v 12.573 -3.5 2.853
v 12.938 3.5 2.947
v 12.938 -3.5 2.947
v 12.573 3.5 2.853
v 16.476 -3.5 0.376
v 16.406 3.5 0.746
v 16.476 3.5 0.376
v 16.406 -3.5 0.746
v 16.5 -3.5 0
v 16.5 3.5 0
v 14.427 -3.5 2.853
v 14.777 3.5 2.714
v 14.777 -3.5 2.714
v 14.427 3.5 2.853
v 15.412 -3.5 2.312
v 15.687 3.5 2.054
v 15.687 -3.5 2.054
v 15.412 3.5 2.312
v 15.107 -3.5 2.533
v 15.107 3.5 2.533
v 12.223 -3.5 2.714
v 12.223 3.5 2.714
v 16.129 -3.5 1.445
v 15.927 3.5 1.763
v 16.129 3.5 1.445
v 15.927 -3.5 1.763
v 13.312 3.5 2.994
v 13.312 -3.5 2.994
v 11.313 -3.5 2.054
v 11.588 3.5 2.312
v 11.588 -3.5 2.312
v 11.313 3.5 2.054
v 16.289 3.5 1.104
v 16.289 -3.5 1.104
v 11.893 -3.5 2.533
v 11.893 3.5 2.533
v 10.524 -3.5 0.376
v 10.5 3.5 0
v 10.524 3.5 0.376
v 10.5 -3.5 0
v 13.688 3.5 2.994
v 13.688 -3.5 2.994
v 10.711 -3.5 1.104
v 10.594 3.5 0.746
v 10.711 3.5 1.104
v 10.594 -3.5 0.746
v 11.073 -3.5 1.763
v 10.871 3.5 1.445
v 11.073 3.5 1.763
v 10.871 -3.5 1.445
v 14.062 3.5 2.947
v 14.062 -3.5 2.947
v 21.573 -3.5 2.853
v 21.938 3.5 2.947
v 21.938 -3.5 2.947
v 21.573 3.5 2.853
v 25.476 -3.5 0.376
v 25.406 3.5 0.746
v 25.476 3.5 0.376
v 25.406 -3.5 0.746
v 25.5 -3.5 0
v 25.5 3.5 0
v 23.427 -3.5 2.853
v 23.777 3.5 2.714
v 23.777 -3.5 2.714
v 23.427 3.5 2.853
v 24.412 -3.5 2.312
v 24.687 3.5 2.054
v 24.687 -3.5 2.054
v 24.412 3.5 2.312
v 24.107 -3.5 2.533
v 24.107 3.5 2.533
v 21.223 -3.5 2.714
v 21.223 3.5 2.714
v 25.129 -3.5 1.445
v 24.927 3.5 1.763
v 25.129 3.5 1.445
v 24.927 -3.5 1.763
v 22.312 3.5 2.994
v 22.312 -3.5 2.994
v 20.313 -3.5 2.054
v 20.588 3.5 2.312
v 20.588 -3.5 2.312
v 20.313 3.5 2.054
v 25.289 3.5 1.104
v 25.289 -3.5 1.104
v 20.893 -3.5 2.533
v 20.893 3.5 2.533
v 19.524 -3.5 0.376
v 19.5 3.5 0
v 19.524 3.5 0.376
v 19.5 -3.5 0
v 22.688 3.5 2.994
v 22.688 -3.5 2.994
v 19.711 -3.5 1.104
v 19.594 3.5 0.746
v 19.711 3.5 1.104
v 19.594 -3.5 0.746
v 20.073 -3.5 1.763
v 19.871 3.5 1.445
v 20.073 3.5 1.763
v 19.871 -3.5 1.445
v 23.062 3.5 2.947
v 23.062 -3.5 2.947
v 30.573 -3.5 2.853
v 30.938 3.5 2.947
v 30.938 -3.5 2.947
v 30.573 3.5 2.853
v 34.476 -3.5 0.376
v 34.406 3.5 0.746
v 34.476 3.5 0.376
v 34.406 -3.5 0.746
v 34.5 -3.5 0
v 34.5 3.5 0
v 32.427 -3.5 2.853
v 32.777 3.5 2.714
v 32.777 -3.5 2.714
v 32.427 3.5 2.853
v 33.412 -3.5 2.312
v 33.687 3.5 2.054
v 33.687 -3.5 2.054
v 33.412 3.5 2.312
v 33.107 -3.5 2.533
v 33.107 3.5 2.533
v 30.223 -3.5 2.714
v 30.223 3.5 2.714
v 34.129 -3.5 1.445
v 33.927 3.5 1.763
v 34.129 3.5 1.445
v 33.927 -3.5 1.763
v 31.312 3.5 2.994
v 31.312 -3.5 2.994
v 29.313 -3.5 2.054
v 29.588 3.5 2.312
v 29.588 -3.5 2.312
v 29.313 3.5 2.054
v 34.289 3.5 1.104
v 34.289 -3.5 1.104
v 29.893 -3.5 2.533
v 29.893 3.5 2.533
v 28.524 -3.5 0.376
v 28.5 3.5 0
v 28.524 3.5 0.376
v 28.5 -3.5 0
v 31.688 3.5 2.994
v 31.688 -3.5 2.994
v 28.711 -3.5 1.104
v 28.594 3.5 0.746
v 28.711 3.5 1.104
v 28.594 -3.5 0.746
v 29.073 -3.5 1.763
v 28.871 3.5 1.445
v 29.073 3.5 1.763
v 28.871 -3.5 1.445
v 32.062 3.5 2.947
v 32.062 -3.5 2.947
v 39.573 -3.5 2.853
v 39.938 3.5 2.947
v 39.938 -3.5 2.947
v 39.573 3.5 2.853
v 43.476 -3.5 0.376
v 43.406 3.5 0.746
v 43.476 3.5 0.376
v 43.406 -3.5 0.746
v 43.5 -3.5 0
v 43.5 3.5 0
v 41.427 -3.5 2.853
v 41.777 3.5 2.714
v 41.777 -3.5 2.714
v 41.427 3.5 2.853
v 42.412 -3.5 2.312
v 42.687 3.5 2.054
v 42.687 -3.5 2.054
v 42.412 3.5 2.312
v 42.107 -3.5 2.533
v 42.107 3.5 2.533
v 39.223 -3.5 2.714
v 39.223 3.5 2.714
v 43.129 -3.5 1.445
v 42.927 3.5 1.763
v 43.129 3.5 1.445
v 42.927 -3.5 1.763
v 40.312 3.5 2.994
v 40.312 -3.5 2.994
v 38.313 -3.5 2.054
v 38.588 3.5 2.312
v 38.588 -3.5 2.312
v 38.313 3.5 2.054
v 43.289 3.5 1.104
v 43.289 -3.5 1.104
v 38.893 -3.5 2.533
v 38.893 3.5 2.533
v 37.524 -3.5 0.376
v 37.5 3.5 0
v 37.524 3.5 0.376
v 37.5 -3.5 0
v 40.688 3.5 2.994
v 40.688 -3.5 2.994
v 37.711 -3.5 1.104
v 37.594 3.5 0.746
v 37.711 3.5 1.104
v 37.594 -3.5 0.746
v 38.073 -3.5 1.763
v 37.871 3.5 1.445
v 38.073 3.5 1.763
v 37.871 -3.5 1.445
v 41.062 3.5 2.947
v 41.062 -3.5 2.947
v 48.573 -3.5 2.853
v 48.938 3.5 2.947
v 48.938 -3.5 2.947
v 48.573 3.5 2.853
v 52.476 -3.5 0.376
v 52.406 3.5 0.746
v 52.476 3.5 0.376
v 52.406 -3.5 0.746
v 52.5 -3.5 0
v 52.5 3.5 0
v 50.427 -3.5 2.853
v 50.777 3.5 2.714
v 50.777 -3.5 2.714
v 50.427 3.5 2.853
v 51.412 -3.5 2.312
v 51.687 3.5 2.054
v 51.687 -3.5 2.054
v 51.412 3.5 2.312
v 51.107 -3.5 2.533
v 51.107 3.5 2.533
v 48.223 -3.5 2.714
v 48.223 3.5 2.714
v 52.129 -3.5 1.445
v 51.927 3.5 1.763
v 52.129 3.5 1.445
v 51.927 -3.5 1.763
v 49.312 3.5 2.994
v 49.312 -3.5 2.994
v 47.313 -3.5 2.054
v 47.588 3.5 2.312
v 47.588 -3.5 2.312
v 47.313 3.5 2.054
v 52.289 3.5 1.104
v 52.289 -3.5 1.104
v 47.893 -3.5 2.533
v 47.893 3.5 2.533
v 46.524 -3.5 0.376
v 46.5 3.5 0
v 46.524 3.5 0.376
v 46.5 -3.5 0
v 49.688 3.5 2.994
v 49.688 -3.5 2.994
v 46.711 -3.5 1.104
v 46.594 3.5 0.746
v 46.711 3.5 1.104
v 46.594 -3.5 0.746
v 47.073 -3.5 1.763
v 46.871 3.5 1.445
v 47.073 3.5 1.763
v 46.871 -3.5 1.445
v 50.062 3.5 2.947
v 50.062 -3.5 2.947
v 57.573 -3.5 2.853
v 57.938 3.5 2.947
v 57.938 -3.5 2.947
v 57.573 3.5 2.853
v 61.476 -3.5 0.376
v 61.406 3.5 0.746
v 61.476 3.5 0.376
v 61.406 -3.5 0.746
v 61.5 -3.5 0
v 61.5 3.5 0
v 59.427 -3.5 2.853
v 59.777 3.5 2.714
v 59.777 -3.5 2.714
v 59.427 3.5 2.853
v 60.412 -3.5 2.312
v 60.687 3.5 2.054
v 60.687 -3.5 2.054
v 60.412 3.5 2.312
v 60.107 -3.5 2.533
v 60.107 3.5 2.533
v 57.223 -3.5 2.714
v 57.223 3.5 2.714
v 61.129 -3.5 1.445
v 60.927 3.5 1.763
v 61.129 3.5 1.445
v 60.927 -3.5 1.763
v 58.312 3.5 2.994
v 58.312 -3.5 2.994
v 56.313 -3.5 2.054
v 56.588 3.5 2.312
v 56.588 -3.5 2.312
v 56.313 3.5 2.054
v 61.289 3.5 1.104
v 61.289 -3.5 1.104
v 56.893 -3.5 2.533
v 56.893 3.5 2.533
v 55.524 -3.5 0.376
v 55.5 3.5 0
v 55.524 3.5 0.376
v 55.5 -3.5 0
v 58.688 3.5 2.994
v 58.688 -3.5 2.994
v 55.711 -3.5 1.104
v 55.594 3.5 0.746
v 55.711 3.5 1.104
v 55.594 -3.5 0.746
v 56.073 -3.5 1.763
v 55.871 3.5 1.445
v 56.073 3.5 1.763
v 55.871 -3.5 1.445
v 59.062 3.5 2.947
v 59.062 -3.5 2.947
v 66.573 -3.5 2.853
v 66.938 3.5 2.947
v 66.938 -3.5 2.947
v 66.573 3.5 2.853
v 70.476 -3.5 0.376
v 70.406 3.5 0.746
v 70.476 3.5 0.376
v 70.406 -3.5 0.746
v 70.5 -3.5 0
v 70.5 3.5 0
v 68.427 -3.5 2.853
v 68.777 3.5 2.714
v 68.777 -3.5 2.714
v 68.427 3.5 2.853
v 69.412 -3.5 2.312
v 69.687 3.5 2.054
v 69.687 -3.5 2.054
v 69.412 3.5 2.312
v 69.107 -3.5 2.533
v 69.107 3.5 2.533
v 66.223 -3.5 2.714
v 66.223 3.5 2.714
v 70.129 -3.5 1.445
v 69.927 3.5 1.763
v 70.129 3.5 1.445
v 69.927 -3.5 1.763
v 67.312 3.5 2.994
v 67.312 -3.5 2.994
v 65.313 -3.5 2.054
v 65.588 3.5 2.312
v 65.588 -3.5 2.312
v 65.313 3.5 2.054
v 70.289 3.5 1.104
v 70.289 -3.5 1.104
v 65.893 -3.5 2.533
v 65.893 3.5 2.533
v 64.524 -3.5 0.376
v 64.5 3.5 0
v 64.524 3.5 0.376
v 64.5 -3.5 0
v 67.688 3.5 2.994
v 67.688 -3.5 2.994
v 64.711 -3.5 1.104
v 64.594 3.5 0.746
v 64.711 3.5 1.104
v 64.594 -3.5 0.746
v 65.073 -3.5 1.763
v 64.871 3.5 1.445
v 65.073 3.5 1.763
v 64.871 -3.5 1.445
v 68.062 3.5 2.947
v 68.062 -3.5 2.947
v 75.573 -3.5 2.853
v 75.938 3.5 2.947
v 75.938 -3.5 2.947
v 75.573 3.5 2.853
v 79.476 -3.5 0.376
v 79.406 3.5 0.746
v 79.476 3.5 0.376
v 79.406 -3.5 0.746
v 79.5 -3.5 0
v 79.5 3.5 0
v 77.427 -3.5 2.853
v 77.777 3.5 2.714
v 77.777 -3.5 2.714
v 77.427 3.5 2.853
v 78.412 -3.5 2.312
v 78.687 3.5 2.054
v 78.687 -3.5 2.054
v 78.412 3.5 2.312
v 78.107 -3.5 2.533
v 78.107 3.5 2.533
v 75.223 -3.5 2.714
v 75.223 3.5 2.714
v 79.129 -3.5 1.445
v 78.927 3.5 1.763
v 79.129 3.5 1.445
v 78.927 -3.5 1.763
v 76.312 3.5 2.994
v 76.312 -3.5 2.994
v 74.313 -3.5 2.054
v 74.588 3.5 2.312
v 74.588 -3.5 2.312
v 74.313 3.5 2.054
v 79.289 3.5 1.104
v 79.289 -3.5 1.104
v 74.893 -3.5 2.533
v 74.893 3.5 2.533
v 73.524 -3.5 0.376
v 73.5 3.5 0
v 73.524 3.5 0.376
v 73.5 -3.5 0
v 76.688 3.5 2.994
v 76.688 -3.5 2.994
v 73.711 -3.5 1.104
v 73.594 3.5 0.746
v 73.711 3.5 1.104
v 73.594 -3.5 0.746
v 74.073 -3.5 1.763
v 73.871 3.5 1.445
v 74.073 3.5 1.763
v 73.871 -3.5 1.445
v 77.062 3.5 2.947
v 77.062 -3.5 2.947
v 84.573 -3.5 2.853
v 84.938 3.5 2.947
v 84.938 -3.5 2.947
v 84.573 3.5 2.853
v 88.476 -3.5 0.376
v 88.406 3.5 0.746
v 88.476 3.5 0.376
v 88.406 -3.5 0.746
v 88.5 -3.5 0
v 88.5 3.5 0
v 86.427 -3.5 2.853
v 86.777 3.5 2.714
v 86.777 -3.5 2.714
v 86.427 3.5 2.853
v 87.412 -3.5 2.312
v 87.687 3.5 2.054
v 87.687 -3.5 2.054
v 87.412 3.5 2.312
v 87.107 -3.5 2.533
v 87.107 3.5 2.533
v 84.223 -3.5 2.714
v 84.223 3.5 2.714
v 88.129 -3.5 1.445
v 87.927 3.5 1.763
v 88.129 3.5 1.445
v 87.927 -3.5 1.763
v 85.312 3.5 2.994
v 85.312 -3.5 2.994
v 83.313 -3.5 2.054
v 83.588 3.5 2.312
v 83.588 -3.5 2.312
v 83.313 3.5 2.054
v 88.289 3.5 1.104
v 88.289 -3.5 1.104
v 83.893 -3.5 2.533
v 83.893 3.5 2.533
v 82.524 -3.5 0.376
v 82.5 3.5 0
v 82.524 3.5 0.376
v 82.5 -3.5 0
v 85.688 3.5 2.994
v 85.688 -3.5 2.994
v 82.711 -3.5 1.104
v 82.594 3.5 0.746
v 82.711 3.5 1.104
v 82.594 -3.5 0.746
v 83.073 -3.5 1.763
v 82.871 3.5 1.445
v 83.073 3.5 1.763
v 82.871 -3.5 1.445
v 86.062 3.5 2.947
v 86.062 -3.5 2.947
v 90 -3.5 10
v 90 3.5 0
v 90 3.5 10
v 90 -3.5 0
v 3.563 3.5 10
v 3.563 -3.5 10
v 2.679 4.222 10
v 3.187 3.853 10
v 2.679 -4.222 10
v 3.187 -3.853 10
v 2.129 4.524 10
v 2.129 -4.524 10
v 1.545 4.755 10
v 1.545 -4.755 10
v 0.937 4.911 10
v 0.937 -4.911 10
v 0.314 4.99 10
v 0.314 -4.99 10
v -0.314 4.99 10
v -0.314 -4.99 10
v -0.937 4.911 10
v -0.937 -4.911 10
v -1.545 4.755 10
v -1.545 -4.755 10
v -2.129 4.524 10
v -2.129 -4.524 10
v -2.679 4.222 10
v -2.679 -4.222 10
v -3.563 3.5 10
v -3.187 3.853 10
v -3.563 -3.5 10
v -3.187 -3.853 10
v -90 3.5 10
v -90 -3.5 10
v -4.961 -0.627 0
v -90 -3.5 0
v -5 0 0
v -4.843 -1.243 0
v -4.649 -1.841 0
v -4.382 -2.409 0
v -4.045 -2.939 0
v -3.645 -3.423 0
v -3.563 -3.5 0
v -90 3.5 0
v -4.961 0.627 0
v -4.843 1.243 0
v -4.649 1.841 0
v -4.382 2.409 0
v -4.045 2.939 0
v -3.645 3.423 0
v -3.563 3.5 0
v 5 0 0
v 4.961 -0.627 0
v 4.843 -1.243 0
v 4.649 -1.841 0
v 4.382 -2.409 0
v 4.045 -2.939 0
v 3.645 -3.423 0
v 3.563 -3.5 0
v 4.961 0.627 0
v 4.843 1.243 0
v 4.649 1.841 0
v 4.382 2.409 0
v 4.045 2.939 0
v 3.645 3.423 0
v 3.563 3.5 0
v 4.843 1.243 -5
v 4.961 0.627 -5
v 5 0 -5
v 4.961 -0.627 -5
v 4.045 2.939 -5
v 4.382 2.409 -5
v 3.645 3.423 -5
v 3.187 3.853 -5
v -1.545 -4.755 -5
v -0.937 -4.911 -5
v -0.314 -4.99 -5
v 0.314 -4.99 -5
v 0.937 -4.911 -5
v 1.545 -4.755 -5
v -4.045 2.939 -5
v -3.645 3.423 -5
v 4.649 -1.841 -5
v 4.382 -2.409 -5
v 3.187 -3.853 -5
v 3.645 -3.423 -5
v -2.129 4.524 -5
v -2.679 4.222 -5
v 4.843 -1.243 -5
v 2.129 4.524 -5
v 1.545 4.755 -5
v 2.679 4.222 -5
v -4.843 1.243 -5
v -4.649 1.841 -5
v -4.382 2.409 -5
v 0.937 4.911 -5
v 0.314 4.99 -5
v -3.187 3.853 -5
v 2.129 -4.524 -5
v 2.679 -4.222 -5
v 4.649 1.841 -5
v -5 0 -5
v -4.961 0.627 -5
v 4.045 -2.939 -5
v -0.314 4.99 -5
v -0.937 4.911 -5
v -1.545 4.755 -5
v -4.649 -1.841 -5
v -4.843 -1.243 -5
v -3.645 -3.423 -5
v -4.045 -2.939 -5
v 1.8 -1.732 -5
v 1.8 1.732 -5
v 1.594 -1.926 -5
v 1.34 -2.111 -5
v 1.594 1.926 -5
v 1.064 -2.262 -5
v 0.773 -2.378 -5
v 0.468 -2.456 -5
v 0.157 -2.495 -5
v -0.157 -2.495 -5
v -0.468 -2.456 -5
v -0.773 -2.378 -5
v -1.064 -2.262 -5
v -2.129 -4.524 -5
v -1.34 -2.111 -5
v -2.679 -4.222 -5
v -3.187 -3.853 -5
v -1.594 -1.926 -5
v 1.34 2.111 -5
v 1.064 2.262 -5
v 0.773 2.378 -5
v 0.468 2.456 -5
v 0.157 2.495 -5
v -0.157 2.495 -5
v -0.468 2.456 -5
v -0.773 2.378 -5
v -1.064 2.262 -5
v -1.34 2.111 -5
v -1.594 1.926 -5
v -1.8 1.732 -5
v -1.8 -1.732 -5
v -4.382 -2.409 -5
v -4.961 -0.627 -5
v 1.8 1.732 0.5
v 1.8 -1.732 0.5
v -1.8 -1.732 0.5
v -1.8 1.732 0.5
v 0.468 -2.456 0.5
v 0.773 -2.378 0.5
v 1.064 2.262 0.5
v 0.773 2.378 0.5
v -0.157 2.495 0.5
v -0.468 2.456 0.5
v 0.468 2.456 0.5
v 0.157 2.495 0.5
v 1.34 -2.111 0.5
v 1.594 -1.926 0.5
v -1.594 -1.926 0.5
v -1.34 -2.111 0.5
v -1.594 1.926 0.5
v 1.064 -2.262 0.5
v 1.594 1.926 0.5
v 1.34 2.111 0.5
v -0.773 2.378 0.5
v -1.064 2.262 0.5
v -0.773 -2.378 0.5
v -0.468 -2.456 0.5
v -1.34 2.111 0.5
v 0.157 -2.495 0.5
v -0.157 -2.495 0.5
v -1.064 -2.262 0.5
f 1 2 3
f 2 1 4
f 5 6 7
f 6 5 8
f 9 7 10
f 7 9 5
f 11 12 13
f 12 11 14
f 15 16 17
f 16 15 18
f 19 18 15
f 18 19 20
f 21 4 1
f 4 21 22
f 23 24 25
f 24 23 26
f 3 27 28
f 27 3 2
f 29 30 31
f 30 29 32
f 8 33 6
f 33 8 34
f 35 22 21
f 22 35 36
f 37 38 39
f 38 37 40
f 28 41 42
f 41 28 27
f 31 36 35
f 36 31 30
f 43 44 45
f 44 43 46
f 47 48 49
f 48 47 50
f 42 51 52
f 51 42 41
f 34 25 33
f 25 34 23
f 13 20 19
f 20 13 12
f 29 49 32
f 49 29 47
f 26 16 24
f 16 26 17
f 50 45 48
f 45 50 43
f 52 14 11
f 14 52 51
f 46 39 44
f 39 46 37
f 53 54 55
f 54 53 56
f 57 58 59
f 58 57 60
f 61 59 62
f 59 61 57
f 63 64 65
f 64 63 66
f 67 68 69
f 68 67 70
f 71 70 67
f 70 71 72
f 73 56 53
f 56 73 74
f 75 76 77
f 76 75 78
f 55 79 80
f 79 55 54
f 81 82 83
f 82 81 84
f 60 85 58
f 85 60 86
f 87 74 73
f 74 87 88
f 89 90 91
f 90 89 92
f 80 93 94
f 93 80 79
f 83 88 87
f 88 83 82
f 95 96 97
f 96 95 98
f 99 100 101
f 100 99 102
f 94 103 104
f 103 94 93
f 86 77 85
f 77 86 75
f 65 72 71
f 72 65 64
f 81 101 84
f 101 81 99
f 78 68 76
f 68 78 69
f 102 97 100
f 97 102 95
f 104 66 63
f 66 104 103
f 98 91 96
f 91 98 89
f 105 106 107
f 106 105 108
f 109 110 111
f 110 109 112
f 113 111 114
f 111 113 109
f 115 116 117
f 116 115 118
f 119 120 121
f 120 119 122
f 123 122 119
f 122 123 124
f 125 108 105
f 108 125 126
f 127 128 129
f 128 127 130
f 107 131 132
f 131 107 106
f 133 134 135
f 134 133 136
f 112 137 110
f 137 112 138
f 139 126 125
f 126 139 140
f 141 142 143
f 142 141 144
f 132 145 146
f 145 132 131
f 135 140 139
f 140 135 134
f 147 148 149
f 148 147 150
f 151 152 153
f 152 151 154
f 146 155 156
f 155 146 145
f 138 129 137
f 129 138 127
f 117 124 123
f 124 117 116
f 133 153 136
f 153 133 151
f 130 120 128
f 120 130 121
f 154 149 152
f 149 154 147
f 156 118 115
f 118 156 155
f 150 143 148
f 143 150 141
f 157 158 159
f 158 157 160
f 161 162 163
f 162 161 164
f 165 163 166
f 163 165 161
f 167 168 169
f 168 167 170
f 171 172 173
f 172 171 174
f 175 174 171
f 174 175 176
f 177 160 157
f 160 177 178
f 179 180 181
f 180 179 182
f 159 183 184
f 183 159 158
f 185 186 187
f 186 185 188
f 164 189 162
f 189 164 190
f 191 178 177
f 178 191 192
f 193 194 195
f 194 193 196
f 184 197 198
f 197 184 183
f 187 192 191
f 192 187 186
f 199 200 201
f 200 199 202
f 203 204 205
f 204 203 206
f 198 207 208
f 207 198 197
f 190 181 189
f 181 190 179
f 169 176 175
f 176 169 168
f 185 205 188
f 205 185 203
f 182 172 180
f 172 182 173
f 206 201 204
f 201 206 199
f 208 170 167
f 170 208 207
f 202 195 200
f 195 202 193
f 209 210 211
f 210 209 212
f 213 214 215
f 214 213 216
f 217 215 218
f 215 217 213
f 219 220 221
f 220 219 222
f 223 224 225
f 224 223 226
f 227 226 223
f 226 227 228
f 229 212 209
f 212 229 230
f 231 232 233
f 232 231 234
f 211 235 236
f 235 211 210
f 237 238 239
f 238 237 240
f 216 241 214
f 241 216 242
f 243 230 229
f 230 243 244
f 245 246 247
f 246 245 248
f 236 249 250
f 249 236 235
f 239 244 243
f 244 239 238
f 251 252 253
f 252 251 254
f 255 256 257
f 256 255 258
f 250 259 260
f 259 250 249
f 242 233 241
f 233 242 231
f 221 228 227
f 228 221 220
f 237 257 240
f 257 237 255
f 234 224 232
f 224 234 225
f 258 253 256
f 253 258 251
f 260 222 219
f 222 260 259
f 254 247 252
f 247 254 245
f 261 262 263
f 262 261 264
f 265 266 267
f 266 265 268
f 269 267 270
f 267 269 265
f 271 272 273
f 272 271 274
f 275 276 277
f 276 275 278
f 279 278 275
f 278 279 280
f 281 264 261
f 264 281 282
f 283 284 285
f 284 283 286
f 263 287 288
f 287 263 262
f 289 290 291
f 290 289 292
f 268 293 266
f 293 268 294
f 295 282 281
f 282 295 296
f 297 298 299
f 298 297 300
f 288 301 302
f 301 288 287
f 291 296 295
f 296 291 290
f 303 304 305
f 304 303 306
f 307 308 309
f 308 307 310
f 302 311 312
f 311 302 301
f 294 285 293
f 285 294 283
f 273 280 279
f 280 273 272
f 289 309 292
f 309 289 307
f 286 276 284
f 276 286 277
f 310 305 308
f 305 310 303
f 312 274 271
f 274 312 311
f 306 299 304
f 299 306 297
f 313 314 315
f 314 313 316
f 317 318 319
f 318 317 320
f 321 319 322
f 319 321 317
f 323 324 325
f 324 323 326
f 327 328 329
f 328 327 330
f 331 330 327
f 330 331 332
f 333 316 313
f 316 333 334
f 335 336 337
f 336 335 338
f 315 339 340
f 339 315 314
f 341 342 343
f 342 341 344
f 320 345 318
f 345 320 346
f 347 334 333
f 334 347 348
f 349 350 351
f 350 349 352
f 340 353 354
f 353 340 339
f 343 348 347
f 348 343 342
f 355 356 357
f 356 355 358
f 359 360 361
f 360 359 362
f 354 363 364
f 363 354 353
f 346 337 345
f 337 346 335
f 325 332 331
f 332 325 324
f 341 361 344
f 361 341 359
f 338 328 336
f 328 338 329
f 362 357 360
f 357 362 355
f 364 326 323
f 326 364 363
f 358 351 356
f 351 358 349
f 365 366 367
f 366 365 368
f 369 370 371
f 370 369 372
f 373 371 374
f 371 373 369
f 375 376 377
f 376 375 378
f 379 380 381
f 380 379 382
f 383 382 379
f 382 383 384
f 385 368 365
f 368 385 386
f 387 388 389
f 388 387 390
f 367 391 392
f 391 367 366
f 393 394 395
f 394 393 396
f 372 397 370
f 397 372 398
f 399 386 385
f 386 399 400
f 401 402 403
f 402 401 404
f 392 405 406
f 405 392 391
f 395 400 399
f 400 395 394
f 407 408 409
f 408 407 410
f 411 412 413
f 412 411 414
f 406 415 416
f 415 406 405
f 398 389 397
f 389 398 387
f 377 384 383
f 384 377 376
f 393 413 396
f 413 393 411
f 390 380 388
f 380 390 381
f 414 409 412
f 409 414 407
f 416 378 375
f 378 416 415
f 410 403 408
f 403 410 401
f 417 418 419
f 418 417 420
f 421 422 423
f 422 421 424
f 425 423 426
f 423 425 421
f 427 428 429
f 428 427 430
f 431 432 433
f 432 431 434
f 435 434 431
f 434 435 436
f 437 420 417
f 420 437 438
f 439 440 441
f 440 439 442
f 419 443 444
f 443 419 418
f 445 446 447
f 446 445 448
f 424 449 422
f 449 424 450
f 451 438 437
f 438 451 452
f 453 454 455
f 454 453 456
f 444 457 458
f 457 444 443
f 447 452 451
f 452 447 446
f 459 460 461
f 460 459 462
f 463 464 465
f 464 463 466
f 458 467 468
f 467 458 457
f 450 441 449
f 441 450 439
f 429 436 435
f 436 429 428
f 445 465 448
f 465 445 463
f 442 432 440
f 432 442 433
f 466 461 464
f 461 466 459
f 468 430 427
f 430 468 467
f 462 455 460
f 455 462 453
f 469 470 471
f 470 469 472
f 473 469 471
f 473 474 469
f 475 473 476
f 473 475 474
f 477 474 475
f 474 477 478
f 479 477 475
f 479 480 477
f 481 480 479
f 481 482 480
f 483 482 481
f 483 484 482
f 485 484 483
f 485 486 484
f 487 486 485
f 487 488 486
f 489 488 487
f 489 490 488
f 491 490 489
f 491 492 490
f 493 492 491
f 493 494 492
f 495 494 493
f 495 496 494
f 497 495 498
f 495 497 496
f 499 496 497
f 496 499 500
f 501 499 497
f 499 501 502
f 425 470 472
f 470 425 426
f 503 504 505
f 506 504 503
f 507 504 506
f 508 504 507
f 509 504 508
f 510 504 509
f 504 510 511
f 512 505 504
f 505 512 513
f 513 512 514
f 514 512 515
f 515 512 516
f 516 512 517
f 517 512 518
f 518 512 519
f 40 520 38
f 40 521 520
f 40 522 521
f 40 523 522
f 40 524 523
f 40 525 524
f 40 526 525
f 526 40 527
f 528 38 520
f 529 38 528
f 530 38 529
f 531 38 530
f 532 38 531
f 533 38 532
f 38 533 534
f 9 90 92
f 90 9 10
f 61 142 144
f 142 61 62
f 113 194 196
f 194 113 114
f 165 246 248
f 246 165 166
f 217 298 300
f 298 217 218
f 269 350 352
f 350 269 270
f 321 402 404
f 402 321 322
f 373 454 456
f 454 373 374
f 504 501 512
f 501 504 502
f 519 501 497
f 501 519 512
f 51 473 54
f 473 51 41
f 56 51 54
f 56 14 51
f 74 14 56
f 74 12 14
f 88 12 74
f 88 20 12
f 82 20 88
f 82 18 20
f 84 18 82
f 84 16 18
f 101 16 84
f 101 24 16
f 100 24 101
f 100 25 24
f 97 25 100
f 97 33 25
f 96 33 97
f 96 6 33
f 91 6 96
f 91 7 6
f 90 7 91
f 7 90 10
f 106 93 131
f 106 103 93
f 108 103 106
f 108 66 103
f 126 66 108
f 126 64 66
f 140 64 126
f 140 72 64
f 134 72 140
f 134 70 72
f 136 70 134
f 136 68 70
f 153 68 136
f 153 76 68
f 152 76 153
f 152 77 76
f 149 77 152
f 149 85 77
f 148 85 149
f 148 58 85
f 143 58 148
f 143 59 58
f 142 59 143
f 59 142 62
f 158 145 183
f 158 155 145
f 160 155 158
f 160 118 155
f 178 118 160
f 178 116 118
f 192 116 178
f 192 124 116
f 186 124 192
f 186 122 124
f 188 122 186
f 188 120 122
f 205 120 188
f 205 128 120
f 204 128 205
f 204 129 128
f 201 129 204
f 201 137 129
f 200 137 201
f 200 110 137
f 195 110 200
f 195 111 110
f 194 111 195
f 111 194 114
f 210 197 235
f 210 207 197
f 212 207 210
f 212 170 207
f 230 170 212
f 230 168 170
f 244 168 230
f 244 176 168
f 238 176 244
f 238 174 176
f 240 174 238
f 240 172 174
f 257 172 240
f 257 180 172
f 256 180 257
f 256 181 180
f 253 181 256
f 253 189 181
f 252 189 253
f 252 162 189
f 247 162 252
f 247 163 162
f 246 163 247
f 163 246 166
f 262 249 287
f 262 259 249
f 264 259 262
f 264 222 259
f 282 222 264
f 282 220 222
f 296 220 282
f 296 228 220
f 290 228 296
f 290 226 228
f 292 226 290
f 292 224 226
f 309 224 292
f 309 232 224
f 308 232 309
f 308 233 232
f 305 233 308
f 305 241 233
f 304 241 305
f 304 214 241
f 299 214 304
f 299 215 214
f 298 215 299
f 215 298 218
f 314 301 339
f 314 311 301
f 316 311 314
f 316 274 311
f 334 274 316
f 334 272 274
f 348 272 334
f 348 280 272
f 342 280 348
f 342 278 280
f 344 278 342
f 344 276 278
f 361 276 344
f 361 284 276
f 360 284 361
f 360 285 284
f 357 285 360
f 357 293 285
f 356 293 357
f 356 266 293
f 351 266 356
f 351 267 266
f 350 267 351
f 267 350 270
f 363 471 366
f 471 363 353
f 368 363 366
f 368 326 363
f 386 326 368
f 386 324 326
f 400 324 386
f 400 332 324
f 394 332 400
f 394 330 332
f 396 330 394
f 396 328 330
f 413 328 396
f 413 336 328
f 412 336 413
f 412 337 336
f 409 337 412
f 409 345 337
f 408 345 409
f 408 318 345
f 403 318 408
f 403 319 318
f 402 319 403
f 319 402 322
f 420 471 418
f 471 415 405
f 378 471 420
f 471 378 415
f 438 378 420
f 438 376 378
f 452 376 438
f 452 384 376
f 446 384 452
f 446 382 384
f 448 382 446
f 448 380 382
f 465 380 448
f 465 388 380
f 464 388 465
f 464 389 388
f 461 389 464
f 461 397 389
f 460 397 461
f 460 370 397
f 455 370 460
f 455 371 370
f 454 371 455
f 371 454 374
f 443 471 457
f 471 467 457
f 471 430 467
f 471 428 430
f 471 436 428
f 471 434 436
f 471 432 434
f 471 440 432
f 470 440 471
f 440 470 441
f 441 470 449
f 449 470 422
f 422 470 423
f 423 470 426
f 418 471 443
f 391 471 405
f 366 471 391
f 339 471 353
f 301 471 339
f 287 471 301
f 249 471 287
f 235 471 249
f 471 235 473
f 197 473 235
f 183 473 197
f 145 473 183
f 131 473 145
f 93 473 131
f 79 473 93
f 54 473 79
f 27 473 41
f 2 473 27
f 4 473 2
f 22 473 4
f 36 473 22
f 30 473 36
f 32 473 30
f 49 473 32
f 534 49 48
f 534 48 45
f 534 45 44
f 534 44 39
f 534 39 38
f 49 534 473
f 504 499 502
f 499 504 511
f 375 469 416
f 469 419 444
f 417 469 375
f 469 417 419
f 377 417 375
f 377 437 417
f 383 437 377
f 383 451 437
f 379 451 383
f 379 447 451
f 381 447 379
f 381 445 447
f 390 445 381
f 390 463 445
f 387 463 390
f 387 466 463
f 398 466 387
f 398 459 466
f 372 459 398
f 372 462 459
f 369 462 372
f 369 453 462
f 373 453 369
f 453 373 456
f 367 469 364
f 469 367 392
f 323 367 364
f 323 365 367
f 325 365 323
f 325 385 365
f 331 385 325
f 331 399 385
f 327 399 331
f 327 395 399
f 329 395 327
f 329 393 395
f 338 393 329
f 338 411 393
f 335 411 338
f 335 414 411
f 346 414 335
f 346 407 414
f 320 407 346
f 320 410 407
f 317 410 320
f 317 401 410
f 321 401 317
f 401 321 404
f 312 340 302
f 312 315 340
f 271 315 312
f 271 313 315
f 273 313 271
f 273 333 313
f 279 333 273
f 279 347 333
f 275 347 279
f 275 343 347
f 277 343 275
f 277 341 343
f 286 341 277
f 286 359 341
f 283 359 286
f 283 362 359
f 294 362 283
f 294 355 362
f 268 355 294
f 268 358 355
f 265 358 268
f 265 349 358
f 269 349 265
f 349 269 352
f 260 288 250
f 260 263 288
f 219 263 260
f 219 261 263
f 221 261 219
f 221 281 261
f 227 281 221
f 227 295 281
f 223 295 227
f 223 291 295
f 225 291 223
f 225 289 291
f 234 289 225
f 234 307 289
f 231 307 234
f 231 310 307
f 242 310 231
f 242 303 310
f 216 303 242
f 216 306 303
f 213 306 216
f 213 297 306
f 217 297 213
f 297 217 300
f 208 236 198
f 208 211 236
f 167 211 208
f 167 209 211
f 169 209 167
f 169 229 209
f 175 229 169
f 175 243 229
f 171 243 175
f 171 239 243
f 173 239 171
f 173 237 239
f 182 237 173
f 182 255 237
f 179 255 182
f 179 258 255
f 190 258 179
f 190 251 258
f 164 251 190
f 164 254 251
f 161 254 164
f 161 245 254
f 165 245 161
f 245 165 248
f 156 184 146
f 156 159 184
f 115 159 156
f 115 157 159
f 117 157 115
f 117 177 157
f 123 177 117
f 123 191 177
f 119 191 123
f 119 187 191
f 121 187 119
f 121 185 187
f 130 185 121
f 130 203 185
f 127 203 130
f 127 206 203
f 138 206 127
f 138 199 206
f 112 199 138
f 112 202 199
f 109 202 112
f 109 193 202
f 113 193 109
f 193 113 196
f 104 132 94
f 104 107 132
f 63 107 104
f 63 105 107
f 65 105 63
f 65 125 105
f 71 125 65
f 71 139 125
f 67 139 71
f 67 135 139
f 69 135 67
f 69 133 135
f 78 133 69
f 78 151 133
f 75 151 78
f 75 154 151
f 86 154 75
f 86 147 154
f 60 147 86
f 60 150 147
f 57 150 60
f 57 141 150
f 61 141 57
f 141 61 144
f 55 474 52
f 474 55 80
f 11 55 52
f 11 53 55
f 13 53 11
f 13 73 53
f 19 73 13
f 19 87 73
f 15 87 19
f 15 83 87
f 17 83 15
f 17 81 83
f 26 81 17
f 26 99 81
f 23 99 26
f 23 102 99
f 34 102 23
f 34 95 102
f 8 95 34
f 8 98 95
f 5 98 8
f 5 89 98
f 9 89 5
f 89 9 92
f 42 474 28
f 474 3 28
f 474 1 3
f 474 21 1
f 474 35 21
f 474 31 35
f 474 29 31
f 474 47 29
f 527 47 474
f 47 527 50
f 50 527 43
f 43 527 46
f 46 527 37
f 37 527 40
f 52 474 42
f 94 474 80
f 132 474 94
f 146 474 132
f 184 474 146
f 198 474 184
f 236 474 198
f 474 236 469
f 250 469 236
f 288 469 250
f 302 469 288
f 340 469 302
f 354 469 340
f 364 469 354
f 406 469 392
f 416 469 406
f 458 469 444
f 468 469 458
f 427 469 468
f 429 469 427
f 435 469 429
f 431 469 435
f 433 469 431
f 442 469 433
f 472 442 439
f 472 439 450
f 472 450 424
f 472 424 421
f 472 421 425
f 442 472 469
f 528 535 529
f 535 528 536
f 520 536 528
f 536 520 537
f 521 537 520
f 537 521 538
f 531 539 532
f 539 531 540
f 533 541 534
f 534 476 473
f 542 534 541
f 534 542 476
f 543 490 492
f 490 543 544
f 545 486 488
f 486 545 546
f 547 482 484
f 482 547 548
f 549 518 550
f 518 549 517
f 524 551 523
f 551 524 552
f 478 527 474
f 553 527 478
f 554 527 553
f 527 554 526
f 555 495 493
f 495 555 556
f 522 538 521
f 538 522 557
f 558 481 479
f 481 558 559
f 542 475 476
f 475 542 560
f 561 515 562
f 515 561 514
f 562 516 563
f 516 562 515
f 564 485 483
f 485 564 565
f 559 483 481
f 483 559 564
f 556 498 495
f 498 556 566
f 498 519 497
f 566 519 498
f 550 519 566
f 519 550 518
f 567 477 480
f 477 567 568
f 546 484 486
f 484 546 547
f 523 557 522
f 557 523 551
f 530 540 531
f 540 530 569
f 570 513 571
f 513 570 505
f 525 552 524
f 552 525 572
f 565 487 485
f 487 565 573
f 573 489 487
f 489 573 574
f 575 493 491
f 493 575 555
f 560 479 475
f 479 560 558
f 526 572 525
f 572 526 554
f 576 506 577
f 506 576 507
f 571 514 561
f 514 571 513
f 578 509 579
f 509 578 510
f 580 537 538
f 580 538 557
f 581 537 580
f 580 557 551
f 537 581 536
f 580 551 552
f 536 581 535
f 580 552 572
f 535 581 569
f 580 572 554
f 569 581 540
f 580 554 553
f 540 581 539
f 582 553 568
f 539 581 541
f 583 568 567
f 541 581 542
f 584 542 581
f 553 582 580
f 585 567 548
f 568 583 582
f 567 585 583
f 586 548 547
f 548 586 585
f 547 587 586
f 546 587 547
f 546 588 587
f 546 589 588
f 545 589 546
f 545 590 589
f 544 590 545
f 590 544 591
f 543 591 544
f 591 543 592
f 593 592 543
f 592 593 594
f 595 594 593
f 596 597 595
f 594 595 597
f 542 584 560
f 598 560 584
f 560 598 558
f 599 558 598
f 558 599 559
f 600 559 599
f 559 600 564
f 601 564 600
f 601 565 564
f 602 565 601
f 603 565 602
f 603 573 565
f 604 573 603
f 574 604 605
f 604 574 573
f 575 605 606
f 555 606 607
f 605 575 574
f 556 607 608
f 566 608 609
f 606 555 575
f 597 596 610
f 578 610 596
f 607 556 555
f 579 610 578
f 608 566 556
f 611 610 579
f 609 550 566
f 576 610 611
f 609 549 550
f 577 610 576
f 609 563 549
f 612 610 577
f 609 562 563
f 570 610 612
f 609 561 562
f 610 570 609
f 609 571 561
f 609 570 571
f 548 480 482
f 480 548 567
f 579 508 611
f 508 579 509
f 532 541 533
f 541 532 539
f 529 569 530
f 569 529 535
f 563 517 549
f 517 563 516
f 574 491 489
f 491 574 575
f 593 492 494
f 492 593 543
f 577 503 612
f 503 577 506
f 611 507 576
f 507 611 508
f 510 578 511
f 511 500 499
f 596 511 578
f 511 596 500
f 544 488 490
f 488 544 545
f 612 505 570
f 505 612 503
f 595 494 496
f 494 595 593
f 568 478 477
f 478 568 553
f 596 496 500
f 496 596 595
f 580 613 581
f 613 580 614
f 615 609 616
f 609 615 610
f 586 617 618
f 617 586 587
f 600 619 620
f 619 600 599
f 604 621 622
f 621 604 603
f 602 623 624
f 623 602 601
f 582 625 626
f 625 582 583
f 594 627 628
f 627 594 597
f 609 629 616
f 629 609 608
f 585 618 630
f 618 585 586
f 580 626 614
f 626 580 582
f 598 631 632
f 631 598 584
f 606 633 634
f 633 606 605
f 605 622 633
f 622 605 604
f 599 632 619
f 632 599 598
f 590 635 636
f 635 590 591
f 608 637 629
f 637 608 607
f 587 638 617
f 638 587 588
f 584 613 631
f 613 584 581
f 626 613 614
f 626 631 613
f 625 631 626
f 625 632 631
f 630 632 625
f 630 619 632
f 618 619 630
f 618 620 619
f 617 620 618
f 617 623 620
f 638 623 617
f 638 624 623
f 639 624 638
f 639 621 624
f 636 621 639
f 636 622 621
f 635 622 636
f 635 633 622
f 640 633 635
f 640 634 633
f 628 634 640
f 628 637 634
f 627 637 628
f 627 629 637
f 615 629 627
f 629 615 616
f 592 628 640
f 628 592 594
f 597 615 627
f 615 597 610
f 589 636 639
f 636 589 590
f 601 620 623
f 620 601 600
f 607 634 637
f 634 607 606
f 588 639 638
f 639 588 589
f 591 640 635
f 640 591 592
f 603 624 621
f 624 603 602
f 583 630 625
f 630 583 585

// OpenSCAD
//Main plate geometry
main_base_thickness = 5;
main_base_r = 90;

//Main ring geometry
main_ring_outer_r = 100;
main_ring_inner_r = 95;
main_ring_h = 60;
ring_clearance = 10;

//Motor hole properties
axel_to_screw_centerline_dist = 8;
screwhole_to_screwhole_dist = 35;
axel_plug_r = 4.75;
axel_base_r = 5/2;
axel_tip_w = 3;


//Arm geometry
arm_length = 2*main_ring_inner_r - ring_clearance;
arm_width = 7;
groove_r = 3;
n_grooves = 10;

//Axel geometry
axel_r = 5/2;
axel_w = 3.6;
axel_h = 8;
axel_small_h = 0;

//Connector geometry
connector_r = 2*axel_r;
connector_h = 15;

difference(){
    union(){
        //Grooved arm
        difference(){
            //Main arm
            translate([-arm_length/2, -arm_width/2, 0]){
                
                cube([arm_length, arm_width, 10]);
            }    

            //Grooves
            translate([arm_length/(4*n_grooves), arm_width, 0]){
                for (i = [1:n_grooves]){
                    translate([i*arm_length/(2*n_grooves), 0, 0,]){
                        rotate([90, 0, 0]) cylinder(h=2*arm_width, r=groove_r, $fn=50);  
                    }
                }
            }
              
        }
        
        //Connector
        translate([0,0,-connector_h+10]){
            cylinder(h=connector_h, r=connector_r, $fn=50);
        }

    }
    
    //Connector hole
//    translate([0,0,-connector_h/2]){
//        %cylinder(h=axel_small_h, r=axel_r, $fn=50);
//    }
    
    translate([0,0,-connector_h/2]){
        intersection(){
            cube([axel_w, 20,20],center=true);
            cylinder(h=axel_h, r=axel_r, $fn=50);
        }
    }
}
